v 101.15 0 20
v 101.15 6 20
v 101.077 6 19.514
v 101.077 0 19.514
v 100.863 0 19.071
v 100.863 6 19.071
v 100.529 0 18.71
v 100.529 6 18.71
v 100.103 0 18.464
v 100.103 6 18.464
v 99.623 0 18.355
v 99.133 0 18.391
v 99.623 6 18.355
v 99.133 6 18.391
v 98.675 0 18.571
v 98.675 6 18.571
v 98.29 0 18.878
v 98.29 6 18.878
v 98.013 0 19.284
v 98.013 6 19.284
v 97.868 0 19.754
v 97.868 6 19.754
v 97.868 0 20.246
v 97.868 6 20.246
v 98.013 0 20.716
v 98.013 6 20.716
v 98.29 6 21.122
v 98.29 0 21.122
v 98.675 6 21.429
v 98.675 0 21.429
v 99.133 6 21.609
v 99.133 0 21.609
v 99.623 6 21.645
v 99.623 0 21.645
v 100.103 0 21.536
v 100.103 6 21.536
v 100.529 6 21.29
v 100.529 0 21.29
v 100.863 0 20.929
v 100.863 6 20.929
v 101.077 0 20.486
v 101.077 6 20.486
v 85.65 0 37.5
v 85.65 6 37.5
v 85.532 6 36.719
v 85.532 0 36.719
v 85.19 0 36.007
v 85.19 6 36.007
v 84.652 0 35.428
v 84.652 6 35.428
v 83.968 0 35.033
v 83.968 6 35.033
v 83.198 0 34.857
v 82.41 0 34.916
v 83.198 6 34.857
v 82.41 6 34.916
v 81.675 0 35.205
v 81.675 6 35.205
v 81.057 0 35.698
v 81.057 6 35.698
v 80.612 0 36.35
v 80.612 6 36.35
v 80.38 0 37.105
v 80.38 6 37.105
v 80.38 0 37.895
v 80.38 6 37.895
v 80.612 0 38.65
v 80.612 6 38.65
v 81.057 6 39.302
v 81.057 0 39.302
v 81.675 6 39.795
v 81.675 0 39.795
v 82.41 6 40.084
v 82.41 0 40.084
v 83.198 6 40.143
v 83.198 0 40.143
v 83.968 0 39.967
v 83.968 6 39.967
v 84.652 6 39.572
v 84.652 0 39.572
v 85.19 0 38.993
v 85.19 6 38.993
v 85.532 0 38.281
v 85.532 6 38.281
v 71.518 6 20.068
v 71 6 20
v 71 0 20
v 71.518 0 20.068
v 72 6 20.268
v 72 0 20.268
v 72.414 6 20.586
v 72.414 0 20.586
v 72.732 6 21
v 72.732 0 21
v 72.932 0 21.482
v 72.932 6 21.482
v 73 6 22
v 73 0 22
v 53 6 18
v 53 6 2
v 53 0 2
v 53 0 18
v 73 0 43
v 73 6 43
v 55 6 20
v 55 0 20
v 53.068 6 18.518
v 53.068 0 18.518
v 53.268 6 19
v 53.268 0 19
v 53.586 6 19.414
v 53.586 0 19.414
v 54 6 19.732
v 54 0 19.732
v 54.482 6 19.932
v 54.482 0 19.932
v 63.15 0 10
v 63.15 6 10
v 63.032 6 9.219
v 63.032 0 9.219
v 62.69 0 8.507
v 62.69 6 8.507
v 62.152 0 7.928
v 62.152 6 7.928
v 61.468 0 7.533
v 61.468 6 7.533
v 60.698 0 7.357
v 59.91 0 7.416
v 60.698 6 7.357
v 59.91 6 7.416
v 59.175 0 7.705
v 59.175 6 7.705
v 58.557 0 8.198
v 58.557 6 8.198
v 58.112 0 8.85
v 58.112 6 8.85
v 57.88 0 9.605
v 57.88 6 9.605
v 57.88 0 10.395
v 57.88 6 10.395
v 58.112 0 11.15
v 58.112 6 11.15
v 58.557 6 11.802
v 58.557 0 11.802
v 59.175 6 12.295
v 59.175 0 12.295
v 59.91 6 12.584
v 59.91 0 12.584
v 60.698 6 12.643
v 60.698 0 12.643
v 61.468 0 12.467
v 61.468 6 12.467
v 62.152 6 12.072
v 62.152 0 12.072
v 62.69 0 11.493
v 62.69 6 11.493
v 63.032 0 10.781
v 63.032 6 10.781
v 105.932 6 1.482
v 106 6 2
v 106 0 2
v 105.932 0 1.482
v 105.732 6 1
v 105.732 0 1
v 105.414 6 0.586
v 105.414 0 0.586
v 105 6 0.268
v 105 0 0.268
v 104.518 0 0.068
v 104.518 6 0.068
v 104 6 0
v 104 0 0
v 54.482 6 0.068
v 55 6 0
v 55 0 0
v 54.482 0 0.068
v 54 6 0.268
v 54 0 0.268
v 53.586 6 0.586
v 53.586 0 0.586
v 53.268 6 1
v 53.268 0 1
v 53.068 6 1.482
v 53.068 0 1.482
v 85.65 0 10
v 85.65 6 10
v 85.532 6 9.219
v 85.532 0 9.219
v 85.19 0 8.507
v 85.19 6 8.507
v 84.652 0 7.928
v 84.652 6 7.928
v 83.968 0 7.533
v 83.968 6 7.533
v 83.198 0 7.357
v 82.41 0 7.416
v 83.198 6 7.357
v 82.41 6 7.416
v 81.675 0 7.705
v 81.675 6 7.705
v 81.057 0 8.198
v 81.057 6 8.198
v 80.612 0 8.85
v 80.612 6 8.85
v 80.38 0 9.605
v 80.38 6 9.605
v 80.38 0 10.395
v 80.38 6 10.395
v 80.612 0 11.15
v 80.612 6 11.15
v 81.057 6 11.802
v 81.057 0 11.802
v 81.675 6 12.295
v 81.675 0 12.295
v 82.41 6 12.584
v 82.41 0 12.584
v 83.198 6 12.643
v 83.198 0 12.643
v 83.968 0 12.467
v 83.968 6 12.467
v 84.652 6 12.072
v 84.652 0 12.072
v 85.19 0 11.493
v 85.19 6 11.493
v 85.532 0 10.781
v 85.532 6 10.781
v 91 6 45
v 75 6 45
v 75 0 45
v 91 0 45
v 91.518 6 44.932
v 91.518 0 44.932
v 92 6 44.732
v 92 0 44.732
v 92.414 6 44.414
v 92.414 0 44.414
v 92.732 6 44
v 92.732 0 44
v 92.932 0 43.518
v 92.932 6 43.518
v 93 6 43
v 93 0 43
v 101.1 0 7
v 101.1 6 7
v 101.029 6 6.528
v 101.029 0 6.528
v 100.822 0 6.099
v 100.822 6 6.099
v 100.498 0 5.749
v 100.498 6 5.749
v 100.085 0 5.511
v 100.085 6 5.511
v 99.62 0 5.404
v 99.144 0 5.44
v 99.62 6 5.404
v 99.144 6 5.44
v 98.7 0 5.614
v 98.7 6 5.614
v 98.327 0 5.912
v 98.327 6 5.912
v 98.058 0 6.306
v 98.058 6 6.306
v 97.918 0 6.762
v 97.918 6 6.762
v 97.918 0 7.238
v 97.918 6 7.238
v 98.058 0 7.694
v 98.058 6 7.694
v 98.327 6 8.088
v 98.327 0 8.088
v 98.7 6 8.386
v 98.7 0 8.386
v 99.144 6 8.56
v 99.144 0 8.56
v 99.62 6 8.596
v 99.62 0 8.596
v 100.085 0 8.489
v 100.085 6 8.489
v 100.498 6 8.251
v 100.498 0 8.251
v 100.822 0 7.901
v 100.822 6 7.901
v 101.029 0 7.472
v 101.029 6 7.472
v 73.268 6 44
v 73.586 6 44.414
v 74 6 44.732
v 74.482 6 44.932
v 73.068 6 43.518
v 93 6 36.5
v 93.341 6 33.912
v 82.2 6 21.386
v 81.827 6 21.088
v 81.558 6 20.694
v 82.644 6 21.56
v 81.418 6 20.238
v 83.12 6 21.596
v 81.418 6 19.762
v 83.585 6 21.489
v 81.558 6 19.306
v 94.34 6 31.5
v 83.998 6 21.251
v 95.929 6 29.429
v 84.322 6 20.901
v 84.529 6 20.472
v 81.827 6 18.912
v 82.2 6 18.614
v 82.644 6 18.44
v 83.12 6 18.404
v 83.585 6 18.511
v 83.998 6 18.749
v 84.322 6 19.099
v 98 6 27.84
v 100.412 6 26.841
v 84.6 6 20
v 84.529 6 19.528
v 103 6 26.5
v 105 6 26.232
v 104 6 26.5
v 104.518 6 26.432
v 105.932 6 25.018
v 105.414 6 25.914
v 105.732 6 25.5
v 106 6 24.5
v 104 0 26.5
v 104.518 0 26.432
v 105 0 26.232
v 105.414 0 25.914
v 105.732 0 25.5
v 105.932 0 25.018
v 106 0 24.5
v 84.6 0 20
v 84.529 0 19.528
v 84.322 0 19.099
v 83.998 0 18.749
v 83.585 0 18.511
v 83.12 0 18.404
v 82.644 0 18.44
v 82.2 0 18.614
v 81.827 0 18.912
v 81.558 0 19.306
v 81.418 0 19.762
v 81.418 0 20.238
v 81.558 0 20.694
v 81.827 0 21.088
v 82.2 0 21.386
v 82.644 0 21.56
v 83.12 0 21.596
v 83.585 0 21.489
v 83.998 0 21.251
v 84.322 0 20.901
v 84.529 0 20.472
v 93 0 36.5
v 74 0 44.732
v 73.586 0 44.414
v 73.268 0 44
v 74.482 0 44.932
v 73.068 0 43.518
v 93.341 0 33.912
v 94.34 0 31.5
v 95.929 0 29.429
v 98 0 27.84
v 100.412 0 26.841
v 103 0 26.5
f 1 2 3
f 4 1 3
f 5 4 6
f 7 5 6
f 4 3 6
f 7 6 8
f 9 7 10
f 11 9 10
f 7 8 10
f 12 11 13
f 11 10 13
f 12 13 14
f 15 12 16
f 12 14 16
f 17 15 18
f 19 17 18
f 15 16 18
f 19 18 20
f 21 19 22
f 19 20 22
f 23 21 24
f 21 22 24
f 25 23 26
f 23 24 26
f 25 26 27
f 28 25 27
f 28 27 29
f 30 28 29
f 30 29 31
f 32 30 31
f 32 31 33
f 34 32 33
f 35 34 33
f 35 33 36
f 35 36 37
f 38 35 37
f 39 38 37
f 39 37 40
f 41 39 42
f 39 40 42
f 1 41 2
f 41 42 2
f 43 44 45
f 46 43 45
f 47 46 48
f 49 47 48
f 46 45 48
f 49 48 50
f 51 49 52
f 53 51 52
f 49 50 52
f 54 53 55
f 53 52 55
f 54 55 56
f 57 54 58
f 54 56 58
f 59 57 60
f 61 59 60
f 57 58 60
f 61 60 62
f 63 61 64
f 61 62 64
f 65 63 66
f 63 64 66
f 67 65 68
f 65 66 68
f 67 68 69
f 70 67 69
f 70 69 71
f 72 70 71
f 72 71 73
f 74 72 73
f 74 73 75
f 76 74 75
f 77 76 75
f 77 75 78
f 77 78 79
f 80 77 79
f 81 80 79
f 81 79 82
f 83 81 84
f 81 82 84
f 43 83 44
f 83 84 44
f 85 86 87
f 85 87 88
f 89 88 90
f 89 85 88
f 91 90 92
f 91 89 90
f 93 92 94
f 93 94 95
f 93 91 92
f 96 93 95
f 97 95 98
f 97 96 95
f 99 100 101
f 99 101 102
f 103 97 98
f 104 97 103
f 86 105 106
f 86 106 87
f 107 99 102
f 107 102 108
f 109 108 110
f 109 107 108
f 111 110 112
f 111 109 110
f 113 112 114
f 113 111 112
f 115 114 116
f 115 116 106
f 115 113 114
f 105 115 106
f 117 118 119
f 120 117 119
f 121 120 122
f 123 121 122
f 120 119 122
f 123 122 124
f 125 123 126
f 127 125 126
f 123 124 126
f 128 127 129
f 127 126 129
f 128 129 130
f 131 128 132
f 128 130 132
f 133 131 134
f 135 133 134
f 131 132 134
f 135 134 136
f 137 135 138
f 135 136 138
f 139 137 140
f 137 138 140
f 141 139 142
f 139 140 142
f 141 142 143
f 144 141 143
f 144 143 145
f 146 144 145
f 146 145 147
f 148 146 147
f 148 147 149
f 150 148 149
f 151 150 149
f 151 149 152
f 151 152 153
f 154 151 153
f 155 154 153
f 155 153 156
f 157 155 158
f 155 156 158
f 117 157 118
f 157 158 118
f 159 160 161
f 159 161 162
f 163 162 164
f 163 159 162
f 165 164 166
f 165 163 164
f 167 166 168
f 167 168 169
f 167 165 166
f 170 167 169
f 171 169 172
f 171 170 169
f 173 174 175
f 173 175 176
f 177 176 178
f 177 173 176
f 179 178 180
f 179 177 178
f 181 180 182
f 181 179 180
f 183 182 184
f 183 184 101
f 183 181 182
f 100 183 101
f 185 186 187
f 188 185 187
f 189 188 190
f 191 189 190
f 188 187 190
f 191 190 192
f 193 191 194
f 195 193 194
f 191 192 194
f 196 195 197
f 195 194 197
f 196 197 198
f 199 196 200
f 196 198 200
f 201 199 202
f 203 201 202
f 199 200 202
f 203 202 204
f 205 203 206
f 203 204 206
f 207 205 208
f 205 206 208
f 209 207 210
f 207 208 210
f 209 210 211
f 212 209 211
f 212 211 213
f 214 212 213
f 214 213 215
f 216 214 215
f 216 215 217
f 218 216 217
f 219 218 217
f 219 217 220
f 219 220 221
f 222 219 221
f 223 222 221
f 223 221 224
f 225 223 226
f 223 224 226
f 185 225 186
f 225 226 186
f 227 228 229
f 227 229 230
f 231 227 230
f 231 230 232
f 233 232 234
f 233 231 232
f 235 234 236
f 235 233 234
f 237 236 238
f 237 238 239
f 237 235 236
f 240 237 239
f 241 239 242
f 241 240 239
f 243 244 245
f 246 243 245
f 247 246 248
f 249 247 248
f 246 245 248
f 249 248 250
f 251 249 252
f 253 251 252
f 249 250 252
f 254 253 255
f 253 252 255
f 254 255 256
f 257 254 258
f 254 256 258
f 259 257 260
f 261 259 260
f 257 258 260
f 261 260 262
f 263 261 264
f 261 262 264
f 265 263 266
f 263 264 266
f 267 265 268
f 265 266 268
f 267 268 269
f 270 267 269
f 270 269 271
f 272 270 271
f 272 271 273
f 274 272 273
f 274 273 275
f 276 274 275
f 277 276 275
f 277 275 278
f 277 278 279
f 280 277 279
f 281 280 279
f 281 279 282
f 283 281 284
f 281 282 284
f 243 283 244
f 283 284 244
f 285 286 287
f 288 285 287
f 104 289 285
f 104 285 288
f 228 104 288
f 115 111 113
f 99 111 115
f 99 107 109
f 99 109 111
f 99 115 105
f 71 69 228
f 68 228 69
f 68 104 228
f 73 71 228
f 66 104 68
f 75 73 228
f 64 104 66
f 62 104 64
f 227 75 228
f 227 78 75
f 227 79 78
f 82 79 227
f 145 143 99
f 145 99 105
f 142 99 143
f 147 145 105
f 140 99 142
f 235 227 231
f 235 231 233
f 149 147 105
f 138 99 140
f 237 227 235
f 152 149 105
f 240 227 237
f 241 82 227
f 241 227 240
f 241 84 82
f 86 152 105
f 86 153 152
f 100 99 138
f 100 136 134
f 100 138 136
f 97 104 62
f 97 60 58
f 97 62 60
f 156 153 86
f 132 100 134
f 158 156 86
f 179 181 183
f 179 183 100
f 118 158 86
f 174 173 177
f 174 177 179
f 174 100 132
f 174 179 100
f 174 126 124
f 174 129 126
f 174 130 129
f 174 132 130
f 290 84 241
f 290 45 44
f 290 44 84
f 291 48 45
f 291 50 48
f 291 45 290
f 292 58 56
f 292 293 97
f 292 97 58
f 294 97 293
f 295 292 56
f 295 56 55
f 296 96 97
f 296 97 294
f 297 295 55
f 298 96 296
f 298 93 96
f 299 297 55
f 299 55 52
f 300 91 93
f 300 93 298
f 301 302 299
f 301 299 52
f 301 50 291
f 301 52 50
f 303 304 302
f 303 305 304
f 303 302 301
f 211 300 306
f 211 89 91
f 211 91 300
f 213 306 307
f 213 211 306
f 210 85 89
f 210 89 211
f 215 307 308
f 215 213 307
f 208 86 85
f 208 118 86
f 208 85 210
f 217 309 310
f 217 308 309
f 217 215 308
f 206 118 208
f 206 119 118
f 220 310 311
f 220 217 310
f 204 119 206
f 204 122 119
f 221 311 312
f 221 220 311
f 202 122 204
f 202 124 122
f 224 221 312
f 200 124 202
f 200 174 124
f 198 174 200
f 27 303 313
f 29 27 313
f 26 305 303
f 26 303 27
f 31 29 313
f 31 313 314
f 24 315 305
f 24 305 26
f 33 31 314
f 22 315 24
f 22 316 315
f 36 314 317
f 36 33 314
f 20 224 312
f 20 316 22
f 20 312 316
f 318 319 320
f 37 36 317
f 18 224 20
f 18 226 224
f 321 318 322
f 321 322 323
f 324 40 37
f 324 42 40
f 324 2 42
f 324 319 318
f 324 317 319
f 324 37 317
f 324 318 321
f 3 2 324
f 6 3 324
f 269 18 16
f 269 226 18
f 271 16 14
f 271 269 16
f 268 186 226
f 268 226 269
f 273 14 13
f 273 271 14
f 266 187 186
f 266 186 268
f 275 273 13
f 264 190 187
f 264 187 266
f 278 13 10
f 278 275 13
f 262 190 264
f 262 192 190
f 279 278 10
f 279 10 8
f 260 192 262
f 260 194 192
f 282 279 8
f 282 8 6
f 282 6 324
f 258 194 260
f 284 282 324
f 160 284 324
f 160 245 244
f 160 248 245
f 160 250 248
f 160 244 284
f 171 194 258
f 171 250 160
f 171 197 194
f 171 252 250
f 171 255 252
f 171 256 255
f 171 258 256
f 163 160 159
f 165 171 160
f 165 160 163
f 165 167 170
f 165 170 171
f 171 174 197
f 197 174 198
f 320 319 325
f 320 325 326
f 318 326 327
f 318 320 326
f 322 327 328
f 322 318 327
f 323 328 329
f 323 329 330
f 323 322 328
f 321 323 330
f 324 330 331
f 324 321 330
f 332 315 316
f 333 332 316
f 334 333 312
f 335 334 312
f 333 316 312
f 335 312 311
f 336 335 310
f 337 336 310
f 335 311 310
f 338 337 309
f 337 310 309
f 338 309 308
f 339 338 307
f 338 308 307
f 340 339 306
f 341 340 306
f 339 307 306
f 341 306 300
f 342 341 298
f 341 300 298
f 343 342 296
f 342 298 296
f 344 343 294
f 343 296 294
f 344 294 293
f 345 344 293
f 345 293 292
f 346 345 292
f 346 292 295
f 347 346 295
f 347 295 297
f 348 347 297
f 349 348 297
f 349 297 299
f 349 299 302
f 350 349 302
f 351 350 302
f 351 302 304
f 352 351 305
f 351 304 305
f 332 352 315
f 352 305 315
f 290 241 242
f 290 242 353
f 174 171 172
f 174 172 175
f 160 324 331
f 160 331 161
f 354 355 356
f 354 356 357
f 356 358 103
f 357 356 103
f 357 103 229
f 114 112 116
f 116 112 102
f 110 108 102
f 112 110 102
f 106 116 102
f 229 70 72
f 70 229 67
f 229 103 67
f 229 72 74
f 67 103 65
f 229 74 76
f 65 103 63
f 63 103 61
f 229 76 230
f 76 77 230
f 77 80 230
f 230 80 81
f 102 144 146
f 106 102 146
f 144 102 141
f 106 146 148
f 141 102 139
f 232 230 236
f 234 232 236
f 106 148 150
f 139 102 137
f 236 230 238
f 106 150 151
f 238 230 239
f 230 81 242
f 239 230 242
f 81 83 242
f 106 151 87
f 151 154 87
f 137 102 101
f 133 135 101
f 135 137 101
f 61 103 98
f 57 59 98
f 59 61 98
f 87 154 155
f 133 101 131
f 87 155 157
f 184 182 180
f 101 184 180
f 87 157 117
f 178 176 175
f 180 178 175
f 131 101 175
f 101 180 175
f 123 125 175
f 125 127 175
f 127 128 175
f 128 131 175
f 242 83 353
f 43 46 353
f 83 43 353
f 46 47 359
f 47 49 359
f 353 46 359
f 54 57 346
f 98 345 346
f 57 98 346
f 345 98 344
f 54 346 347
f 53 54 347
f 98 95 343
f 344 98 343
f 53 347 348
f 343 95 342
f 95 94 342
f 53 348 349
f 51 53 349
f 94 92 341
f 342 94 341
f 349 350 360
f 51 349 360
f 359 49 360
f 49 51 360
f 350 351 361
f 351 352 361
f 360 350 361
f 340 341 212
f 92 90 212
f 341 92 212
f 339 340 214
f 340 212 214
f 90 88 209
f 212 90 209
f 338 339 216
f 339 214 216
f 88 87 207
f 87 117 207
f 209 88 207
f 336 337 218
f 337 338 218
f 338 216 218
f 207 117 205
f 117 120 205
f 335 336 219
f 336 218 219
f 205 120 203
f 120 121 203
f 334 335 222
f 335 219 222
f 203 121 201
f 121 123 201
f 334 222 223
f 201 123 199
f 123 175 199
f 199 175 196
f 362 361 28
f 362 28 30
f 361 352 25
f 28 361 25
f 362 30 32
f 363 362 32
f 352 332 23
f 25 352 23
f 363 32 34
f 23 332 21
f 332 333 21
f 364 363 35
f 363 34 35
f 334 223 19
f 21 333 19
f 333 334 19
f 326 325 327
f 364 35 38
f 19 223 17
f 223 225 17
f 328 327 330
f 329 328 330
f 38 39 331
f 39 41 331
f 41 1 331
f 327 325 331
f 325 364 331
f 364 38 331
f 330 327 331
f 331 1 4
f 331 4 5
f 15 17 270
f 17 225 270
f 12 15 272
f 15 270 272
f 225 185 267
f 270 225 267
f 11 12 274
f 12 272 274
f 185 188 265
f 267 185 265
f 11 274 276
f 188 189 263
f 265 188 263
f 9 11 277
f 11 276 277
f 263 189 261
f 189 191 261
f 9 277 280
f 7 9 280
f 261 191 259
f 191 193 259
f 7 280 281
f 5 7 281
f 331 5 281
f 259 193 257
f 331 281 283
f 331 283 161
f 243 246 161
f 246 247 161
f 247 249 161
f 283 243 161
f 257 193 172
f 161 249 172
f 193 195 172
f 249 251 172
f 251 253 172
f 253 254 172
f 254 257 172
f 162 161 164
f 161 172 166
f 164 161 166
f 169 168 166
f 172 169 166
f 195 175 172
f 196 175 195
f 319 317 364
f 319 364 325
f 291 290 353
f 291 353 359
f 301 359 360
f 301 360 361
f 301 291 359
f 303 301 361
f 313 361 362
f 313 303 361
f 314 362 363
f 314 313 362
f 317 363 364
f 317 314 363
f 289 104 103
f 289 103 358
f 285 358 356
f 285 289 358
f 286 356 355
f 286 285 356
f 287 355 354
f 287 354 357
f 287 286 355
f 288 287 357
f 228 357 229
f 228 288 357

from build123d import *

# Parameters (mm, degrees)
SKETCH1_R           = 1.65
SKETCH1_R_2         = 1.6
SKETCH1_R_3         = 2.65
BOSS_EXTRUDE1_DEPTH = 6


with BuildPart() as part:
    # Sketch1 → Boss-Extrude1 (new body)
    with BuildSketch(Plane(origin=(0, 6, 0), x_dir=(1, 0, 0), z_dir=(0, 1, 0))):
        with BuildLine():
            Line((104, 0), (55, 0))
            ThreePointArc((55, 0), (53.585786438, -0.585786438), (53, -2))
            Line((53, -2), (53, -18))
            ThreePointArc((53, -18), (53.585786438, -19.414213562), (55, -20))
            Line((55, -20), (71, -20))
            ThreePointArc((71, -20), (72.414213562, -20.585786438), (73, -22))
            Line((73, -22), (73, -43))
            ThreePointArc((73, -43), (73.585786438, -44.414213562), (75, -45))
            Line((75, -45), (91, -45))
            ThreePointArc((91, -45), (92.414213562, -44.414213562), (93, -43))
            Line((93, -43), (93, -36.5))
            ThreePointArc((93, -36.5), (95.928932188, -29.428932188), (103, -26.5))
            Line((103, -26.5), (104, -26.5))
            ThreePointArc((104, -26.5), (105.414213562, -25.914213562), (106, -24.5))
            Line((106, -24.5), (106, -2))
            ThreePointArc((106, -2), (105.414213562, -0.585786438), (104, 0))
        make_face()
        with Locations((99.5, -20)):
            Circle(SKETCH1_R, mode=Mode.SUBTRACT)
        with Locations((99.5, -7)):
            Circle(SKETCH1_R_2, mode=Mode.SUBTRACT)
        with Locations((83, -20)):
            Circle(SKETCH1_R_2, mode=Mode.SUBTRACT)
        with Locations((83, -10)):
            Circle(SKETCH1_R_3, mode=Mode.SUBTRACT)
        with Locations((60.5, -10)):
            Circle(SKETCH1_R_3, mode=Mode.SUBTRACT)
        with Locations((83, -37.5)):
            Circle(SKETCH1_R_3, mode=Mode.SUBTRACT)
    extrude(amount=-BOSS_EXTRUDE1_DEPTH)


solid = part.part
